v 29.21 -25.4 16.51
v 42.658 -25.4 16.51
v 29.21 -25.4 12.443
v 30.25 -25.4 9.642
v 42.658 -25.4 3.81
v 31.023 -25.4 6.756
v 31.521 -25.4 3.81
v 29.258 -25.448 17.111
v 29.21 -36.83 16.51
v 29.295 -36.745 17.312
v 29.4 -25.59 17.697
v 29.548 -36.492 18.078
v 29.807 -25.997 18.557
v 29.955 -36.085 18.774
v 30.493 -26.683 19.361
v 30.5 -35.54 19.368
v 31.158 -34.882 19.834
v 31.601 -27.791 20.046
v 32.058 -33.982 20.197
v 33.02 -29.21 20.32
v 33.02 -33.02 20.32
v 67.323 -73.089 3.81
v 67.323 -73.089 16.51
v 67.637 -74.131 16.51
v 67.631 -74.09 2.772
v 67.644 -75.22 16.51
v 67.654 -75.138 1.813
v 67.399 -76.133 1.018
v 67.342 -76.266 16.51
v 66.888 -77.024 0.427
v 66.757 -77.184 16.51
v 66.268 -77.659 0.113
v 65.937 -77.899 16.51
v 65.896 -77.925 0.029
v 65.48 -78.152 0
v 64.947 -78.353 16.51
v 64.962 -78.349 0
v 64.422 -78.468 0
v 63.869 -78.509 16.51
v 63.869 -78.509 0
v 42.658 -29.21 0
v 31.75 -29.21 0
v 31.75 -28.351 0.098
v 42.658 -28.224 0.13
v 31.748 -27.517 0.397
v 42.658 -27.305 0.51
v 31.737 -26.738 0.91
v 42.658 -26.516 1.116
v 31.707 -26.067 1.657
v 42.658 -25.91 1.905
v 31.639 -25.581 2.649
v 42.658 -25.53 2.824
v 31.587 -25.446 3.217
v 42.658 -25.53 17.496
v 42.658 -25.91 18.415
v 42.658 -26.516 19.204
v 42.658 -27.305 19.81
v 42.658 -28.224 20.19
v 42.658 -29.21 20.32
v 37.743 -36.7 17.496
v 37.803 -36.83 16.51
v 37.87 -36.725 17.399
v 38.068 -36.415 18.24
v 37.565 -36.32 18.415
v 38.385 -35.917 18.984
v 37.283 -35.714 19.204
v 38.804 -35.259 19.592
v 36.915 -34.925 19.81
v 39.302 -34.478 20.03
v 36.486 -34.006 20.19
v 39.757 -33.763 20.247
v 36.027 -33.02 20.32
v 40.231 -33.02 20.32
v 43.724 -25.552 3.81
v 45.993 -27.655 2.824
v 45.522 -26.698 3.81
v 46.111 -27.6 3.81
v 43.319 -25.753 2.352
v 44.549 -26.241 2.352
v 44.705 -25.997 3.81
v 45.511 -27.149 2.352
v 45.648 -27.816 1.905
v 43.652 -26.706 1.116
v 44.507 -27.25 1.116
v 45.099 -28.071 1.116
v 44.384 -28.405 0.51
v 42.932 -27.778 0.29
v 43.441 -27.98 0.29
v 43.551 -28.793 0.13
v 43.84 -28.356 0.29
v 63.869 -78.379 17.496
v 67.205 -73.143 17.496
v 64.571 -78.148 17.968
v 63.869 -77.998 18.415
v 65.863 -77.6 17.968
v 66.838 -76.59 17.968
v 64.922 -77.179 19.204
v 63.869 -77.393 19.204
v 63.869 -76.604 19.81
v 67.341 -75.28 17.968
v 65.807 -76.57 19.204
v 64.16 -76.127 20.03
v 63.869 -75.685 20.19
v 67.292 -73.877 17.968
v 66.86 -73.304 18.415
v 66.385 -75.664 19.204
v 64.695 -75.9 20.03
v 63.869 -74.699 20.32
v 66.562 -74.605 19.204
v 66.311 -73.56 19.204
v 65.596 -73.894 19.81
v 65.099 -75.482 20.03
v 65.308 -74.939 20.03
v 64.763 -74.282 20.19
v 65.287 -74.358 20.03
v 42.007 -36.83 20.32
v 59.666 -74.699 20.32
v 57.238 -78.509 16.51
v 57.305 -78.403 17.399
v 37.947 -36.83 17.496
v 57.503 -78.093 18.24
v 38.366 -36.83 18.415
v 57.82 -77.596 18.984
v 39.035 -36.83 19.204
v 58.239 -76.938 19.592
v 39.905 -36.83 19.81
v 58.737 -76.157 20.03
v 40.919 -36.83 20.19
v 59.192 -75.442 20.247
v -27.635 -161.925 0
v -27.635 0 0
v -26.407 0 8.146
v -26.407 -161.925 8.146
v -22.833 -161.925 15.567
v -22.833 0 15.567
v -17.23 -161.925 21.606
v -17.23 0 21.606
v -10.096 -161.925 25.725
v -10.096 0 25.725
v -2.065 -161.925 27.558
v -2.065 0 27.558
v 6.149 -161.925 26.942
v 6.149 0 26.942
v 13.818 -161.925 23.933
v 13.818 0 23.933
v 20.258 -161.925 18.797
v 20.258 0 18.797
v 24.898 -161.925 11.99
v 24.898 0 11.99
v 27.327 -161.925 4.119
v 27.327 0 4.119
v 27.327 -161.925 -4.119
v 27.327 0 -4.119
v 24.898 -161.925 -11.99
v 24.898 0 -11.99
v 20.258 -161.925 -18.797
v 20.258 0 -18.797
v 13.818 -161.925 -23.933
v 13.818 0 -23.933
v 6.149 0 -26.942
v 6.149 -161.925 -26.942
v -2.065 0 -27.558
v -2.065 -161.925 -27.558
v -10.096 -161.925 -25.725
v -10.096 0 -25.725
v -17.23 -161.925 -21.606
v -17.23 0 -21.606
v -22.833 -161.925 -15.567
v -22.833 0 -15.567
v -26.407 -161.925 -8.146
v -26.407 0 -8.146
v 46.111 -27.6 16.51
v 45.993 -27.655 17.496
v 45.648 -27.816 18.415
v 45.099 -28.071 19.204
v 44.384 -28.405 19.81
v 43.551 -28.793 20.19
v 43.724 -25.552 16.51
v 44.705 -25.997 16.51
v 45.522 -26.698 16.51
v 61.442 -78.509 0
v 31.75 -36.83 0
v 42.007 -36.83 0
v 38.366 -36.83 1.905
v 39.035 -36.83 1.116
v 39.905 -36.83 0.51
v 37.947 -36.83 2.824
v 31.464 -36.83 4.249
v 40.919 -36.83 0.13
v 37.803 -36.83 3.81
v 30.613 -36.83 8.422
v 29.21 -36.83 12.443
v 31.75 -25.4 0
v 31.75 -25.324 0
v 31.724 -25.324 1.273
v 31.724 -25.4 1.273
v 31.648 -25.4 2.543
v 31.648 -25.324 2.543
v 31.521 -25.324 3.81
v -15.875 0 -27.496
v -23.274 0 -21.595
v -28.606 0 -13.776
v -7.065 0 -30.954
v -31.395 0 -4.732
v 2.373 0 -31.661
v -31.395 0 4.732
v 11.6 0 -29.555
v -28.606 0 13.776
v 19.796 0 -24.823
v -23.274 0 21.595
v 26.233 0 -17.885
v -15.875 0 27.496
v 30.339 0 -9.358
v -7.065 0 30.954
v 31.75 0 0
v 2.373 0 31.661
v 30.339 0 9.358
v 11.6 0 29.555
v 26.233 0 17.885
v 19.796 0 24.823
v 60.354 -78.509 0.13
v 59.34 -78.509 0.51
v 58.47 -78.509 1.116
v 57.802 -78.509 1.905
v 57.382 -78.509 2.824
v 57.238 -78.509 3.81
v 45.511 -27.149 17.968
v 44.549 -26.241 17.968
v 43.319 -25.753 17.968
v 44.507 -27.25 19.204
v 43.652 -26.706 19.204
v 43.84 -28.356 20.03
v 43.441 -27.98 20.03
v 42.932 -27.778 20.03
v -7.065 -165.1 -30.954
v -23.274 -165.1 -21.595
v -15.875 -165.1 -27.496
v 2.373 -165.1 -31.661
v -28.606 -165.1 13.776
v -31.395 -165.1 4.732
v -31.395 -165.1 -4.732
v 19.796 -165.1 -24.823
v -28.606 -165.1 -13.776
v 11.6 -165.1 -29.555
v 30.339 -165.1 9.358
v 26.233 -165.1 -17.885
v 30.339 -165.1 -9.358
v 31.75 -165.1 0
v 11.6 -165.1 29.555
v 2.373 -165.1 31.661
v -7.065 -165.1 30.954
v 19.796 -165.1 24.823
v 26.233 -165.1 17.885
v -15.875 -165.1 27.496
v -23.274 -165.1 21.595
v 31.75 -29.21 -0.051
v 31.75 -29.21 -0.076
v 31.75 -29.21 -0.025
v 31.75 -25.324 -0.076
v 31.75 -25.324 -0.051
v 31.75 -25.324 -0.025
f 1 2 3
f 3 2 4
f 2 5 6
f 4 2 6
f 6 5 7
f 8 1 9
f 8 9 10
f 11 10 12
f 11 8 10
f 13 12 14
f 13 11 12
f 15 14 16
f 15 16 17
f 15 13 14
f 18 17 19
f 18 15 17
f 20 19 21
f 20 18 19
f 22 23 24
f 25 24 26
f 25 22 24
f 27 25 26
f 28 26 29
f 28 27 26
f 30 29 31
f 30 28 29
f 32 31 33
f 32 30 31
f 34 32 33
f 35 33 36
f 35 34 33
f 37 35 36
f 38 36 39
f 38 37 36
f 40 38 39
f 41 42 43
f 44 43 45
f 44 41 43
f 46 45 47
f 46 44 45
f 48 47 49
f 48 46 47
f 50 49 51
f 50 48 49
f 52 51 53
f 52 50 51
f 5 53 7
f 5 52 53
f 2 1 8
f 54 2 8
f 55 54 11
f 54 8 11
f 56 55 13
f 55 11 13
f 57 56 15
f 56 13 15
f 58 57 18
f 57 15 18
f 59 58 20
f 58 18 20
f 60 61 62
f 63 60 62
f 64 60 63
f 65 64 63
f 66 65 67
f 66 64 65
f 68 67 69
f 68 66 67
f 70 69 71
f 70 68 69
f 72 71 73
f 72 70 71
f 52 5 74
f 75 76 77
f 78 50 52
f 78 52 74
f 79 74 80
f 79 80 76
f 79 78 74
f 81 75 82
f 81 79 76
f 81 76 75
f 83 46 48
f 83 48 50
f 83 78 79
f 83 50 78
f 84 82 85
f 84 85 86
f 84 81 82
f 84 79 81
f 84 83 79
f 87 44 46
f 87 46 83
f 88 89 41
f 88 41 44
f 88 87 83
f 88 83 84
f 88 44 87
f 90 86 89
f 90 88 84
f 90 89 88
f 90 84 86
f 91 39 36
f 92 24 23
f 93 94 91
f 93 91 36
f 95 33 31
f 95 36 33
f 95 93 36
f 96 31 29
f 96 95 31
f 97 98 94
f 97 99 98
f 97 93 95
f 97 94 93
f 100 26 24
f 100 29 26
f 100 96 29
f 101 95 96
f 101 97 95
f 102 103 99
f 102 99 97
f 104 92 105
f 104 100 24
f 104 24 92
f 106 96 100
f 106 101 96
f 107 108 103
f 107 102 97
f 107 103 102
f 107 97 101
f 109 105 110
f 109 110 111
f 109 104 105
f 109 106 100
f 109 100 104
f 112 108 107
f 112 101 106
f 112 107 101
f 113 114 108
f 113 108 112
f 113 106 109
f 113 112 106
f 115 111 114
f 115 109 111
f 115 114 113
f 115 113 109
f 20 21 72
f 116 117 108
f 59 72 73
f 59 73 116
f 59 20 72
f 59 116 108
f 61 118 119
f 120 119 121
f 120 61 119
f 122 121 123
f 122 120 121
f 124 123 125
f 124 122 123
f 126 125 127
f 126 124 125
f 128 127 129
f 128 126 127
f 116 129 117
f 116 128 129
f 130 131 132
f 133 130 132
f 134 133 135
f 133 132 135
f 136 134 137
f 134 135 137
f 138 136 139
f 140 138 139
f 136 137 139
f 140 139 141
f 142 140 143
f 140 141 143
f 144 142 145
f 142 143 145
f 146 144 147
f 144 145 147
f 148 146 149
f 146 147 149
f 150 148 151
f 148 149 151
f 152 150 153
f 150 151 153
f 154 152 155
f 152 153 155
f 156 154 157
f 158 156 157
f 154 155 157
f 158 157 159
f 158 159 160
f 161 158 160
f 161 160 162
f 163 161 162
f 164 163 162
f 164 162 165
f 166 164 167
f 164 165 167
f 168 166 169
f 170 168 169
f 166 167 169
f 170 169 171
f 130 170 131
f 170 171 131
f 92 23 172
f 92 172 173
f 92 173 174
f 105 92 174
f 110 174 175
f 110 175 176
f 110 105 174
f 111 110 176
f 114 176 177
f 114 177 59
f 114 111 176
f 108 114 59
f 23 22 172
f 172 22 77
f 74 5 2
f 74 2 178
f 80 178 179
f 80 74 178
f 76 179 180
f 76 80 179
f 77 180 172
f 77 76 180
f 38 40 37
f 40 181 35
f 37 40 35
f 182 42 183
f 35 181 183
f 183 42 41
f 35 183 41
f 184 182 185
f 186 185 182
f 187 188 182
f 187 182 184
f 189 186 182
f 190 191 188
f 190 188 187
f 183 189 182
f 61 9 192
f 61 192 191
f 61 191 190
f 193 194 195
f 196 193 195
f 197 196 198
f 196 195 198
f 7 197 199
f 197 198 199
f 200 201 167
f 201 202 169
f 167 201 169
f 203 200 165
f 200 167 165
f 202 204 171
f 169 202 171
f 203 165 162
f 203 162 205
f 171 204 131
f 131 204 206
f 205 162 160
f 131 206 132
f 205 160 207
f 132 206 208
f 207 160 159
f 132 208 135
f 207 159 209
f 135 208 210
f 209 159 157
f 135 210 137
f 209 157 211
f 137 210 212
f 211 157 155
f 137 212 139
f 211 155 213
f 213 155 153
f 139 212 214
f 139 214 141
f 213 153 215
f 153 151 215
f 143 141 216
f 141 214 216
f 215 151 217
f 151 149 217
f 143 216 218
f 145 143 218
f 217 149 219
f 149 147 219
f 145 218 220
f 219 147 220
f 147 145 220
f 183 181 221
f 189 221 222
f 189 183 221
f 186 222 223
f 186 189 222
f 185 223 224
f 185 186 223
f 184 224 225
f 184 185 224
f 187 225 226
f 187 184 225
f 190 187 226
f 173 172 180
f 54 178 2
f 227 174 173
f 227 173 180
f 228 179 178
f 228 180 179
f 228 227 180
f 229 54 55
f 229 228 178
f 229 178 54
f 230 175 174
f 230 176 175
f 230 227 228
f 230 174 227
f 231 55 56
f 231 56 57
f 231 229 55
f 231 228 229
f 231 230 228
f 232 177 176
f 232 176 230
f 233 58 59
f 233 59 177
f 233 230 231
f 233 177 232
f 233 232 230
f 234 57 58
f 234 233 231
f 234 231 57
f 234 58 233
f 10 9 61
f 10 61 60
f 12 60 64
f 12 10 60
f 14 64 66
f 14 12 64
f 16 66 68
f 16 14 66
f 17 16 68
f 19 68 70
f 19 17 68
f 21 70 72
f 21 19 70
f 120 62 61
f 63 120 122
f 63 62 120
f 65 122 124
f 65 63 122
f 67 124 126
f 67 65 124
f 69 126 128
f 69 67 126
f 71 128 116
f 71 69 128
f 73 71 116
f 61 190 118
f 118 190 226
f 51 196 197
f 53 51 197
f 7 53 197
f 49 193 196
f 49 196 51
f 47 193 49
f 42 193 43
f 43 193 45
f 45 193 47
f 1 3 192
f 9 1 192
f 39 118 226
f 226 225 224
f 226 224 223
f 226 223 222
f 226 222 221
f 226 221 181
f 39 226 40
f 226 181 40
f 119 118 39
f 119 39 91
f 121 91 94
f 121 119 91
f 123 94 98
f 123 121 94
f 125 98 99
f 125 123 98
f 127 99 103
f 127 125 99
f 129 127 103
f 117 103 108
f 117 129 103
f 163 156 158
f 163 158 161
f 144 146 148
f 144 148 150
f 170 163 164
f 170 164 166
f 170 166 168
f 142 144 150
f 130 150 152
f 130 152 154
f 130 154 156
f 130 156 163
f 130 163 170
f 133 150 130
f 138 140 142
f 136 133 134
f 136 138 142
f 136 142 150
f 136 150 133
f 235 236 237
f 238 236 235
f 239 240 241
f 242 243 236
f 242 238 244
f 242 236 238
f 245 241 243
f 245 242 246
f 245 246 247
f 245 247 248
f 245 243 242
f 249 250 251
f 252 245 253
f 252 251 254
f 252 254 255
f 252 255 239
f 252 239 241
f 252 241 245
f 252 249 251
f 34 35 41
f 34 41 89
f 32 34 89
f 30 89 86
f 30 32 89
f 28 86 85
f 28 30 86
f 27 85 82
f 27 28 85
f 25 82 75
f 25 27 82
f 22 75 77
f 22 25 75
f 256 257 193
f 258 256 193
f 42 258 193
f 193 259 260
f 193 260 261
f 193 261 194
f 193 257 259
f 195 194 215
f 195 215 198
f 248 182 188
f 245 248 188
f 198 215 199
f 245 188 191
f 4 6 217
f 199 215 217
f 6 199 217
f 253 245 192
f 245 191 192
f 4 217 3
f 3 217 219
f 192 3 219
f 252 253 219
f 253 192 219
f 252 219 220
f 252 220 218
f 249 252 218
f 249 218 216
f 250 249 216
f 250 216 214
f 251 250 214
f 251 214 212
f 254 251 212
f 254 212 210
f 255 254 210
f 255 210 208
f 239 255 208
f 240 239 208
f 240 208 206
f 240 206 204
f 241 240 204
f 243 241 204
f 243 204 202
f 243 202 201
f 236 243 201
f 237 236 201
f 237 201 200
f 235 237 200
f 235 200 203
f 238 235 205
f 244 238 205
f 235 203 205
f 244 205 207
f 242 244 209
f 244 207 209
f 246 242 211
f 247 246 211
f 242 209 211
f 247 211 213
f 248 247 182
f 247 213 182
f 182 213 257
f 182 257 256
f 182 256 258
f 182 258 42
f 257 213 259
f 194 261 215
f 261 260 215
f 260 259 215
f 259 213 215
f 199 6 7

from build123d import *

# Parameters (mm, degrees)
F0_R          = 31.75
F0_R_2        = 28.575
F1_DEPTH      = 165.1
F3_DEPTH      = 20.32
F4_T1_DEPTH   = 16.51
F4_T3_DEPTH   = 12.7
F4_T5_DEPTH   = 50.1912424643
F4_T7_DEPTH   = 13.4477623063
F4_T9_DEPTH   = 11.43
F4_T14_DEPTH  = 3.8862
F4_T20_DEPTH  = 3.8862
F4_T26_DEPTH  = 3.8862
F4_T32_DEPTH  = 65.6967445131
F4_T37_DEPTH  = 18.118286919
F4_T42_DEPTH  = 65.037372593
F4_T48_DEPTH  = 16.1561075649
F4_T53_DEPTH  = 65.037372593
F4_T59_DEPTH  = 20.4327623063
F4_S60_R      = 31.75
F4_T61_DEPTH  = 12
F4_T66_DEPTH  = 65.6967445131
F4_T70_DEPTH  = 31.461255122
F4_T77_DEPTH  = 20.955
F4_T81_DEPTH  = 22.9727623063
F4_T88_DEPTH  = 27.643286919
F4_T92_DEPTH  = 20.955
F4_T99_DEPTH  = 18.118286919
F4_T103_DEPTH = 65.037372593
F4_T110_DEPTH = 16.1561075649
F4_T114_DEPTH = 65.037372593
F5_R          = 27.6352
F6_DEPTH      = 161.925


# Not quite as in the source:
# - a fillet or chamfer that OpenCascade refuses, or shapes differently, is made with other operations: its cross-section is extruded or revolved along the edge and cut away or added


with BuildPart() as f1:
    # F0 (on Front) → F1 (new body)
    with BuildSketch(Plane.XZ):
        Circle(F0_R)
        Circle(F0_R_2, mode=Mode.SUBTRACT)
        Circle(F0_R_2)
    extrude(amount=F1_DEPTH)

    # F2 (on Top) → F3 (join)
    with BuildSketch(Plane.XY):
        Polygon((45.085, -25.4), (29.21, -25.4), (29.21, -36.83), (37.803286919, -36.83), (57.2383903863, -78.5087138864), (69.85, -78.5087138864), align=None)
    extrude(amount=F3_DEPTH)

    # F4: fillet of radius 3.81 on 11 edges, made by hand

    # F4_s2 → F4_t1 (cut)
    with BuildSketch(Plane.XY):
        with BuildLine():
            ThreePointArc((67.3225306198, -73.0885383092), (67.0828193597, -76.7458253942), (63.8694979512, -78.5087138864))
            Line((63.8694979512, -78.5087138864), (63.8694979512, -78.5849138864))
            Line((63.8694979512, -78.5849138864), (69.969610041, -78.5849138864))
            Line((69.969610041, -78.5849138864), (67.3915912732, -73.0563347976))
            Line((67.3915912732, -73.0563347976), (67.3225306198, -73.0885383092))
        make_face()
    extrude(amount=F4_T1_DEPTH, mode=Mode.SUBTRACT)

    # F4_s4 → F4_t3 (cut)
    with BuildSketch(Plane.XY.offset(3.81)):
        with BuildLine():
            ThreePointArc((42.6577623063, -25.4), (44.7048738141, -25.9966785915), (46.1107949749, -27.5998244228))
            Line((46.1107949749, -27.5998244228), (46.1798556283, -27.5676209112))
            Line((46.1798556283, -27.5676209112), (45.1335447539, -25.3238))
            Line((45.1335447539, -25.3238), (42.6577623063, -25.3238))
            Line((42.6577623063, -25.3238), (42.6577623063, -25.4))
        make_face()
    extrude(amount=F4_T3_DEPTH, mode=Mode.SUBTRACT)

    # F4_s6 → F4_t5 (cut)
    with BuildSketch(Plane(origin=(40.018755356, -85.8204978112, 0), x_dir=(0, 0, 1), z_dir=(-0.4226182617, 0.906307787, 0))):
        with BuildLine():
            ThreePointArc((16.51, 30.1263827303), (19.2040768363, 29.0104595667), (20.32, 26.3163827303))
            Line((20.32, 26.3163827303), (20.3962, 26.3163827303))
            Line((20.3962, 26.3163827303), (20.3962, 30.2025827303))
            Line((20.3962, 30.2025827303), (16.51, 30.2025827303))
            Line((16.51, 30.2025827303), (16.51, 30.1263827303))
        make_face()
    extrude(amount=F4_T5_DEPTH, mode=Mode.SUBTRACT)

    # F4_s8 → F4_t7 (cut)
    with BuildSketch(Plane.YZ.offset(29.21)):
        with BuildLine():
            ThreePointArc((-25.4, 16.51), (-26.5159231637, 19.2040768363), (-29.21, 20.32))
            Line((-29.21, 20.32), (-29.21, 20.3962))
            Line((-29.21, 20.3962), (-25.3238, 20.3962))
            Line((-25.3238, 20.3962), (-25.3238, 16.51))
            Line((-25.3238, 16.51), (-25.4, 16.51))
        make_face()
    extrude(amount=F4_T7_DEPTH, mode=Mode.SUBTRACT)

    # F4_s10 → F4_t9 (cut)
    with BuildSketch(Plane.XZ.offset(25.4)):
        with BuildLine():
            ThreePointArc((29.21, 16.51), (30.3259231637, 19.2040768363), (33.02, 20.32))
            Line((33.02, 20.32), (33.02, 20.3962))
            Line((33.02, 20.3962), (29.1338, 20.3962))
            Line((29.1338, 20.3962), (29.1338, 16.51))
            Line((29.1338, 16.51), (29.21, 16.51))
        make_face()
    extrude(amount=F4_T9_DEPTH, mode=Mode.SUBTRACT)


with BuildPart() as f4_tool12:
    # F4_s13 → F4_t14 (new body)
    with BuildSketch(Plane.XY.offset(16.51)):
        Polygon((63.8694979512, -74.6987138864), (67.3915912732, -73.0563347976), (69.969610041, -78.5849138864), (63.8694979512, -78.5849138864), align=None)
    extrude(amount=F4_T14_DEPTH)

    # F4_s15 → F4_t16 (revolve, cut)
    with BuildSketch(Plane(origin=(63.8694979512, -74.6987138864, 16.51), x_dir=(-0.8433914458, 0.5372996083, 0), z_dir=(0.5372996083, 0.8433914458, 0))):
        with BuildLine():
            ThreePointArc((0, -3.81), (3.81, 0), (0, 3.81))
            Line((0, 3.81), (0, -3.81))
        make_face()
    revolve(axis=Axis((63.8694979512, -74.6987138864, 16.51), (0, 0, 1)), mode=Mode.SUBTRACT)


with BuildPart() as f1_1:
    add(f1.part)

    # F4_t11: cut F4_tool12
    add(f4_tool12.part, mode=Mode.SUBTRACT)


with BuildPart() as f4_tool18:
    # F4_s19 → F4_t20 (new body)
    with BuildSketch(Plane.XY.offset(3.81)):
        Polygon((42.6577623063, -29.21), (42.6577623063, -25.3238), (45.1335447539, -25.3238), (46.1798556283, -27.5676209112), align=None)
    extrude(amount=-F4_T20_DEPTH)

    # F4_s21 → F4_t22 (revolve, cut)
    with BuildSketch(Plane(origin=(42.6577623063, -29.21, 3.81), x_dir=(-0.5372996083, -0.8433914458, 0), z_dir=(0.8433914458, -0.5372996083, 0))):
        with BuildLine():
            ThreePointArc((0, -3.81), (3.81, 0), (0, 3.81))
            Line((0, 3.81), (0, -3.81))
        make_face()
    revolve(axis=Axis((42.6577623063, -29.21, 3.81), (0, 0, -1)), mode=Mode.SUBTRACT)


with BuildPart() as f1_2:
    add(f1_1.part)

    # F4_t17: cut F4_tool18
    add(f4_tool18.part, mode=Mode.SUBTRACT)


with BuildPart() as f4_tool24:
    # F4_s25 → F4_t26 (new body)
    with BuildSketch(Plane.XY.offset(16.51)):
        Polygon((42.6577623063, -29.21), (42.6577623063, -25.3238), (45.1335447539, -25.3238), (46.1798556283, -27.5676209112), align=None)
    extrude(amount=F4_T26_DEPTH)

    # F4_s27 → F4_t28 (revolve, cut)
    with BuildSketch(Plane(origin=(42.6577623063, -29.21, 16.51), x_dir=(-0.5372996083, -0.8433914458, 0), z_dir=(-0.8433914458, 0.5372996083, 0))):
        with BuildLine():
            ThreePointArc((0, -3.81), (3.81, 0), (0, 3.81))
            Line((0, 3.81), (0, -3.81))
        make_face()
    revolve(axis=Axis((42.6577623063, -29.21, 16.51), (0, 0, 1)), mode=Mode.SUBTRACT)


with BuildPart() as f1_3:
    add(f1_2.part)

    # F4_t23: cut F4_tool24
    add(f4_tool24.part, mode=Mode.SUBTRACT)


with BuildPart() as f4_tool30:
    # F4_s31 → F4_t32 (new body)
    with BuildSketch(Plane(origin=(46.5716636793, -99.87325506, 0), x_dir=(0, 0, 1), z_dir=(-0.4226182617, 0.906307787, 0))):
        with BuildLine():
            ThreePointArc((0, 26.3163827303), (1.1159231637, 29.0104595667), (3.81, 30.1263827303))
            Line((3.81, 30.1263827303), (3.81, 30.2025827303))
            Line((3.81, 30.2025827303), (-0.0762, 30.2025827303))
            Line((-0.0762, 30.2025827303), (-0.0762, 26.3163827303))
            Line((-0.0762, 26.3163827303), (0, 26.3163827303))
        make_face()
    extrude(amount=F4_T32_DEPTH)

    split(bisect_by=Plane.XZ.offset(78.5087138864), keep=Keep.BOTTOM)


with BuildPart() as f1_4:
    add(f1_3.part)

    # F4_t29: cut F4_tool30
    add(f4_tool30.part, mode=Mode.SUBTRACT)


with BuildPart() as f4_tool35:
    # F4_s36 → F4_t37 (new body)
    with BuildSketch(Plane.YZ.offset(29.21)):
        with BuildLine():
            ThreePointArc((-36.83, 16.51), (-35.7140768363, 19.2040768363), (-33.02, 20.32))
            Line((-33.02, 20.32), (-33.02, 20.3962))
            Line((-33.02, 20.3962), (-36.9062, 20.3962))
            Line((-36.9062, 20.3962), (-36.9062, 16.51))
            Line((-36.9062, 16.51), (-36.83, 16.51))
        make_face()
    extrude(amount=F4_T37_DEPTH)

    split(bisect_by=Plane(origin=(16.9446772579, 7.9014327703, 0), x_dir=(0, 0, 1), z_dir=(-0.906307787, -0.4226182617, 0)), keep=Keep.TOP)


with BuildPart() as f1_5:
    add(f1_4.part)

    # F4_t34: cut F4_tool35
    add(f4_tool35.part, mode=Mode.SUBTRACT)


with BuildPart() as f4_tool40:
    # F4_s41 → F4_t42 (new body)
    with BuildSketch(Plane(origin=(16.833170718, -36.0988510988, 0), x_dir=(0, 0, 1), z_dir=(0.4226182617, -0.906307787, 0))):
        with BuildLine():
            ThreePointArc((16.51, -18.6963827303), (19.2040768363, -19.812305894), (20.32, -22.5063827303))
            Line((20.32, -22.5063827303), (20.3962, -22.5063827303))
            Line((20.3962, -22.5063827303), (20.3962, -18.6201827303))
            Line((20.3962, -18.6201827303), (16.51, -18.6201827303))
            Line((16.51, -18.6201827303), (16.51, -18.6963827303))
        make_face()
    extrude(amount=F4_T42_DEPTH)

    split(bisect_by=Plane.XZ.offset(36.83), keep=Keep.TOP)

    split(bisect_by=Plane.XZ.offset(78.5087138864), keep=Keep.BOTTOM)


with BuildPart() as f1_6:
    add(f1_5.part)

    # F4_t39: cut F4_tool40
    add(f4_tool40.part, mode=Mode.SUBTRACT)


with BuildPart() as f4_tool46:
    # F4_s47 → F4_t48 (new body)
    with BuildSketch(Plane.YZ.offset(47.7133903863)):
        with BuildLine():
            ThreePointArc((-78.5087138864, 16.51), (-77.3927907227, 19.2040768363), (-74.6987138864, 20.32))
            Line((-74.6987138864, 20.32), (-74.6987138864, 20.3962))
            Line((-74.6987138864, 20.3962), (-78.5849138864, 20.3962))
            Line((-78.5849138864, 20.3962), (-78.5849138864, 16.51))
            Line((-78.5849138864, 16.51), (-78.5087138864, 16.51))
        make_face()
    extrude(amount=F4_T48_DEPTH)

    split(bisect_by=Plane(origin=(16.9446772579, 7.9014327703, 0), x_dir=(0, 0, 1), z_dir=(0.906307787, 0.4226182617, 0)), keep=Keep.TOP)


with BuildPart() as f1_7:
    add(f1_6.part)

    # F4_t45: cut F4_tool46
    add(f4_tool46.part, mode=Mode.SUBTRACT)


with BuildPart() as f4_tool51:
    # F4_s52 → F4_t53 (new body)
    with BuildSketch(Plane(origin=(16.833170718, -36.0988510988, 0), x_dir=(0, 0, 1), z_dir=(0.4226182617, -0.906307787, 0))):
        with BuildLine():
            ThreePointArc((0, -22.5063827303), (1.1159231637, -19.812305894), (3.81, -18.6963827303))
            Line((3.81, -18.6963827303), (3.81, -18.6201827303))
            Line((3.81, -18.6201827303), (-0.0762, -18.6201827303))
            Line((-0.0762, -18.6201827303), (-0.0762, -22.5063827303))
            Line((-0.0762, -22.5063827303), (0, -22.5063827303))
        make_face()
    extrude(amount=F4_T53_DEPTH)

    split(bisect_by=Plane.XZ.offset(78.5087138864), keep=Keep.BOTTOM)

    split(bisect_by=Plane.XZ.offset(36.83), keep=Keep.TOP)


with BuildPart() as f1_8:
    add(f1_7.part)

    # F4_t50: cut F4_tool51
    add(f4_tool51.part, mode=Mode.SUBTRACT)


with BuildPart() as f4_tool57:
    # F4_s58 → F4_t59 (new body)
    with BuildSketch(Plane.YZ.offset(42.6577623063)):
        with BuildLine():
            ThreePointArc((-29.21, 0), (-26.5159231637, 1.1159231637), (-25.4, 3.81))
            Line((-25.4, 3.81), (-25.3238, 3.81))
            Line((-25.3238, 3.81), (-25.3238, -0.0762))
            Line((-25.3238, -0.0762), (-29.21, -0.0762))
            Line((-29.21, -0.0762), (-29.21, 0))
        make_face()
    extrude(amount=-F4_T59_DEPTH)

    # F4_s60 → F4_t61 (cut, symmetric)
    with BuildSketch(Plane.XZ.offset(27.3)):
        Circle(F4_S60_R)
    extrude(amount=F4_T61_DEPTH, both=True, mode=Mode.SUBTRACT)


with BuildPart() as f1_9:
    add(f1_8.part)

    # F4_t56: cut F4_tool57
    add(f4_tool57.part, mode=Mode.SUBTRACT)


with BuildPart() as f4_tool64:
    # F4_s65 → F4_t66 (new body)
    with BuildSketch(Plane(origin=(46.5716636793, -99.87325506, 0), x_dir=(0, 0, 1), z_dir=(-0.4226182617, 0.906307787, 0))):
        with BuildLine():
            ThreePointArc((0, 26.3163827303), (1.1159231637, 29.0104595667), (3.81, 30.1263827303))
            Line((3.81, 30.1263827303), (3.81, 30.2025827303))
            Line((3.81, 30.2025827303), (-0.0762, 30.2025827303))
            Line((-0.0762, 30.2025827303), (-0.0762, 26.3163827303))
            Line((-0.0762, 26.3163827303), (0, 26.3163827303))
        make_face()
    extrude(amount=F4_T66_DEPTH)

    split(bisect_by=Plane.XZ.offset(78.5087138864), keep=Keep.TOP)


with BuildPart() as f4_tool68:
    # F4_s69 → F4_t70 (new body)
    with BuildSketch(Plane.XY.offset(-14.951255122)):
        with BuildLine():
            ThreePointArc((67.3225306198, -73.0885383092), (67.0828193597, -76.7458253942), (63.8694979512, -78.5087138864))
            Line((63.8694979512, -78.5087138864), (63.8694979512, -78.5849138864))
            Line((63.8694979512, -78.5849138864), (69.969610041, -78.5849138864))
            Line((69.969610041, -78.5849138864), (67.3915912732, -73.0563347976))
            Line((67.3915912732, -73.0563347976), (67.3225306198, -73.0885383092))
        make_face()
    extrude(amount=F4_T70_DEPTH)

    split(bisect_by=Plane.XY, keep=Keep.BOTTOM)


with BuildPart() as f4_tool64_1:
    add(f4_tool64.part)

    # F4_t72: intersect F4_tool68
    add(f4_tool68.part, mode=Mode.INTERSECT)


with BuildPart() as f1_10:
    add(f1_9.part)

    # F4_t62: cut F4_tool64
    add(f4_tool64_1.part, mode=Mode.SUBTRACT)


with BuildPart() as f4_tool75:
    # F4_s76 → F4_t77 (new body)
    with BuildSketch(Plane.XZ.offset(15.875)):
        with BuildLine():
            ThreePointArc((29.21, 16.51), (30.3259231637, 19.2040768363), (33.02, 20.32))
            Line((33.02, 20.32), (33.02, 20.3962))
            Line((33.02, 20.3962), (29.1338, 20.3962))
            Line((29.1338, 20.3962), (29.1338, 16.51))
            Line((29.1338, 16.51), (29.21, 16.51))
        make_face()
    extrude(amount=F4_T77_DEPTH)

    split(bisect_by=Plane.XZ.offset(25.4), keep=Keep.BOTTOM)


with BuildPart() as f4_tool79:
    # F4_s80 → F4_t81 (new body)
    with BuildSketch(Plane.YZ.offset(42.6577623063)):
        with BuildLine():
            ThreePointArc((-25.4, 16.51), (-26.5159231637, 19.2040768363), (-29.21, 20.32))
            Line((-29.21, 20.32), (-29.21, 20.3962))
            Line((-29.21, 20.3962), (-25.3238, 20.3962))
            Line((-25.3238, 20.3962), (-25.3238, 16.51))
            Line((-25.3238, 16.51), (-25.4, 16.51))
        make_face()
    extrude(amount=-F4_T81_DEPTH)

    split(bisect_by=Plane.YZ.offset(29.21), keep=Keep.BOTTOM)


with BuildPart() as f4_tool75_1:
    add(f4_tool75.part)

    # F4_t83: intersect F4_tool79
    add(f4_tool79.part, mode=Mode.INTERSECT)


with BuildPart() as f1_11:
    add(f1_10.part)

    # F4_t73: cut F4_tool75
    add(f4_tool75_1.part, mode=Mode.SUBTRACT)


with BuildPart() as f4_tool86:
    # F4_s87 → F4_t88 (new body)
    with BuildSketch(Plane.YZ.offset(19.685)):
        with BuildLine():
            ThreePointArc((-36.83, 16.51), (-35.7140768363, 19.2040768363), (-33.02, 20.32))
            Line((-33.02, 20.32), (-33.02, 20.3962))
            Line((-33.02, 20.3962), (-36.9062, 20.3962))
            Line((-36.9062, 20.3962), (-36.9062, 16.51))
            Line((-36.9062, 16.51), (-36.83, 16.51))
        make_face()
    extrude(amount=F4_T88_DEPTH)

    split(bisect_by=Plane.YZ.offset(29.21), keep=Keep.BOTTOM)


with BuildPart() as f4_tool90:
    # F4_s91 → F4_t92 (new body)
    with BuildSketch(Plane.XZ.offset(25.4)):
        with BuildLine():
            ThreePointArc((29.21, 16.51), (30.3259231637, 19.2040768363), (33.02, 20.32))
            Line((33.02, 20.32), (33.02, 20.3962))
            Line((33.02, 20.3962), (29.1338, 20.3962))
            Line((29.1338, 20.3962), (29.1338, 16.51))
            Line((29.1338, 16.51), (29.21, 16.51))
        make_face()
    extrude(amount=F4_T92_DEPTH)

    split(bisect_by=Plane.XZ.offset(36.83), keep=Keep.TOP)


with BuildPart() as f4_tool86_1:
    add(f4_tool86.part)

    # F4_t94: intersect F4_tool90
    add(f4_tool90.part, mode=Mode.INTERSECT)


with BuildPart() as f1_12:
    add(f1_11.part)

    # F4_t84: cut F4_tool86
    add(f4_tool86_1.part, mode=Mode.SUBTRACT)


with BuildPart() as f4_tool97:
    # F4_s98 → F4_t99 (new body)
    with BuildSketch(Plane.YZ.offset(29.21)):
        with BuildLine():
            ThreePointArc((-36.83, 16.51), (-35.7140768363, 19.2040768363), (-33.02, 20.32))
            Line((-33.02, 20.32), (-33.02, 20.3962))
            Line((-33.02, 20.3962), (-36.9062, 20.3962))
            Line((-36.9062, 20.3962), (-36.9062, 16.51))
            Line((-36.9062, 16.51), (-36.83, 16.51))
        make_face()
    extrude(amount=F4_T99_DEPTH)

    split(bisect_by=Plane(origin=(16.9446772579, 7.9014327703, 0), x_dir=(0, 0, 1), z_dir=(0.906307787, 0.4226182617, 0)), keep=Keep.TOP)


with BuildPart() as f4_tool101:
    # F4_s102 → F4_t103 (new body)
    with BuildSketch(Plane(origin=(16.833170718, -36.0988510988, 0), x_dir=(0, 0, 1), z_dir=(0.4226182617, -0.906307787, 0))):
        with BuildLine():
            ThreePointArc((16.51, -18.6963827303), (19.2040768363, -19.812305894), (20.32, -22.5063827303))
            Line((20.32, -22.5063827303), (20.3962, -22.5063827303))
            Line((20.3962, -22.5063827303), (20.3962, -18.6201827303))
            Line((20.3962, -18.6201827303), (16.51, -18.6201827303))
            Line((16.51, -18.6201827303), (16.51, -18.6963827303))
        make_face()
    extrude(amount=F4_T103_DEPTH)

    split(bisect_by=Plane.XZ.offset(36.83), keep=Keep.BOTTOM)


with BuildPart() as f4_tool97_1:
    add(f4_tool97.part)

    # F4_t105: intersect F4_tool101
    add(f4_tool101.part, mode=Mode.INTERSECT)


with BuildPart() as f1_13:
    add(f1_12.part)

    # F4_t95: cut F4_tool97
    add(f4_tool97_1.part, mode=Mode.SUBTRACT)


with BuildPart() as f4_tool108:
    # F4_s109 → F4_t110 (new body)
    with BuildSketch(Plane.YZ.offset(47.7133903863)):
        with BuildLine():
            ThreePointArc((-78.5087138864, 16.51), (-77.3927907227, 19.2040768363), (-74.6987138864, 20.32))
            Line((-74.6987138864, 20.32), (-74.6987138864, 20.3962))
            Line((-74.6987138864, 20.3962), (-78.5849138864, 20.3962))
            Line((-78.5849138864, 20.3962), (-78.5849138864, 16.51))
            Line((-78.5849138864, 16.51), (-78.5087138864, 16.51))
        make_face()
    extrude(amount=F4_T110_DEPTH)

    split(bisect_by=Plane(origin=(16.9446772579, 7.9014327703, 0), x_dir=(0, 0, 1), z_dir=(-0.906307787, -0.4226182617, 0)), keep=Keep.TOP)


with BuildPart() as f4_tool112:
    # F4_s113 → F4_t114 (new body)
    with BuildSketch(Plane(origin=(16.833170718, -36.0988510988, 0), x_dir=(0, 0, 1), z_dir=(0.4226182617, -0.906307787, 0))):
        with BuildLine():
            ThreePointArc((16.51, -18.6963827303), (19.2040768363, -19.812305894), (20.32, -22.5063827303))
            Line((20.32, -22.5063827303), (20.3962, -22.5063827303))
            Line((20.3962, -22.5063827303), (20.3962, -18.6201827303))
            Line((20.3962, -18.6201827303), (16.51, -18.6201827303))
            Line((16.51, -18.6201827303), (16.51, -18.6963827303))
        make_face()
    extrude(amount=F4_T114_DEPTH)

    split(bisect_by=Plane.XZ.offset(78.5087138864), keep=Keep.TOP)


with BuildPart() as f4_tool108_1:
    add(f4_tool108.part)

    # F4_t116: intersect F4_tool112
    add(f4_tool112.part, mode=Mode.INTERSECT)


with BuildPart() as f1_14:
    add(f1_13.part)

    # F4_t106: cut F4_tool108
    add(f4_tool108_1.part, mode=Mode.SUBTRACT)

    # F5 (on face) → F6 (cut)
    with BuildSketch(Plane(origin=(0, 0, 0), x_dir=(-1, 0, 0), z_dir=(0, 1, 0))):
        Circle(F5_R)
    extrude(amount=-F6_DEPTH, mode=Mode.SUBTRACT)


solid = f1_14.part
